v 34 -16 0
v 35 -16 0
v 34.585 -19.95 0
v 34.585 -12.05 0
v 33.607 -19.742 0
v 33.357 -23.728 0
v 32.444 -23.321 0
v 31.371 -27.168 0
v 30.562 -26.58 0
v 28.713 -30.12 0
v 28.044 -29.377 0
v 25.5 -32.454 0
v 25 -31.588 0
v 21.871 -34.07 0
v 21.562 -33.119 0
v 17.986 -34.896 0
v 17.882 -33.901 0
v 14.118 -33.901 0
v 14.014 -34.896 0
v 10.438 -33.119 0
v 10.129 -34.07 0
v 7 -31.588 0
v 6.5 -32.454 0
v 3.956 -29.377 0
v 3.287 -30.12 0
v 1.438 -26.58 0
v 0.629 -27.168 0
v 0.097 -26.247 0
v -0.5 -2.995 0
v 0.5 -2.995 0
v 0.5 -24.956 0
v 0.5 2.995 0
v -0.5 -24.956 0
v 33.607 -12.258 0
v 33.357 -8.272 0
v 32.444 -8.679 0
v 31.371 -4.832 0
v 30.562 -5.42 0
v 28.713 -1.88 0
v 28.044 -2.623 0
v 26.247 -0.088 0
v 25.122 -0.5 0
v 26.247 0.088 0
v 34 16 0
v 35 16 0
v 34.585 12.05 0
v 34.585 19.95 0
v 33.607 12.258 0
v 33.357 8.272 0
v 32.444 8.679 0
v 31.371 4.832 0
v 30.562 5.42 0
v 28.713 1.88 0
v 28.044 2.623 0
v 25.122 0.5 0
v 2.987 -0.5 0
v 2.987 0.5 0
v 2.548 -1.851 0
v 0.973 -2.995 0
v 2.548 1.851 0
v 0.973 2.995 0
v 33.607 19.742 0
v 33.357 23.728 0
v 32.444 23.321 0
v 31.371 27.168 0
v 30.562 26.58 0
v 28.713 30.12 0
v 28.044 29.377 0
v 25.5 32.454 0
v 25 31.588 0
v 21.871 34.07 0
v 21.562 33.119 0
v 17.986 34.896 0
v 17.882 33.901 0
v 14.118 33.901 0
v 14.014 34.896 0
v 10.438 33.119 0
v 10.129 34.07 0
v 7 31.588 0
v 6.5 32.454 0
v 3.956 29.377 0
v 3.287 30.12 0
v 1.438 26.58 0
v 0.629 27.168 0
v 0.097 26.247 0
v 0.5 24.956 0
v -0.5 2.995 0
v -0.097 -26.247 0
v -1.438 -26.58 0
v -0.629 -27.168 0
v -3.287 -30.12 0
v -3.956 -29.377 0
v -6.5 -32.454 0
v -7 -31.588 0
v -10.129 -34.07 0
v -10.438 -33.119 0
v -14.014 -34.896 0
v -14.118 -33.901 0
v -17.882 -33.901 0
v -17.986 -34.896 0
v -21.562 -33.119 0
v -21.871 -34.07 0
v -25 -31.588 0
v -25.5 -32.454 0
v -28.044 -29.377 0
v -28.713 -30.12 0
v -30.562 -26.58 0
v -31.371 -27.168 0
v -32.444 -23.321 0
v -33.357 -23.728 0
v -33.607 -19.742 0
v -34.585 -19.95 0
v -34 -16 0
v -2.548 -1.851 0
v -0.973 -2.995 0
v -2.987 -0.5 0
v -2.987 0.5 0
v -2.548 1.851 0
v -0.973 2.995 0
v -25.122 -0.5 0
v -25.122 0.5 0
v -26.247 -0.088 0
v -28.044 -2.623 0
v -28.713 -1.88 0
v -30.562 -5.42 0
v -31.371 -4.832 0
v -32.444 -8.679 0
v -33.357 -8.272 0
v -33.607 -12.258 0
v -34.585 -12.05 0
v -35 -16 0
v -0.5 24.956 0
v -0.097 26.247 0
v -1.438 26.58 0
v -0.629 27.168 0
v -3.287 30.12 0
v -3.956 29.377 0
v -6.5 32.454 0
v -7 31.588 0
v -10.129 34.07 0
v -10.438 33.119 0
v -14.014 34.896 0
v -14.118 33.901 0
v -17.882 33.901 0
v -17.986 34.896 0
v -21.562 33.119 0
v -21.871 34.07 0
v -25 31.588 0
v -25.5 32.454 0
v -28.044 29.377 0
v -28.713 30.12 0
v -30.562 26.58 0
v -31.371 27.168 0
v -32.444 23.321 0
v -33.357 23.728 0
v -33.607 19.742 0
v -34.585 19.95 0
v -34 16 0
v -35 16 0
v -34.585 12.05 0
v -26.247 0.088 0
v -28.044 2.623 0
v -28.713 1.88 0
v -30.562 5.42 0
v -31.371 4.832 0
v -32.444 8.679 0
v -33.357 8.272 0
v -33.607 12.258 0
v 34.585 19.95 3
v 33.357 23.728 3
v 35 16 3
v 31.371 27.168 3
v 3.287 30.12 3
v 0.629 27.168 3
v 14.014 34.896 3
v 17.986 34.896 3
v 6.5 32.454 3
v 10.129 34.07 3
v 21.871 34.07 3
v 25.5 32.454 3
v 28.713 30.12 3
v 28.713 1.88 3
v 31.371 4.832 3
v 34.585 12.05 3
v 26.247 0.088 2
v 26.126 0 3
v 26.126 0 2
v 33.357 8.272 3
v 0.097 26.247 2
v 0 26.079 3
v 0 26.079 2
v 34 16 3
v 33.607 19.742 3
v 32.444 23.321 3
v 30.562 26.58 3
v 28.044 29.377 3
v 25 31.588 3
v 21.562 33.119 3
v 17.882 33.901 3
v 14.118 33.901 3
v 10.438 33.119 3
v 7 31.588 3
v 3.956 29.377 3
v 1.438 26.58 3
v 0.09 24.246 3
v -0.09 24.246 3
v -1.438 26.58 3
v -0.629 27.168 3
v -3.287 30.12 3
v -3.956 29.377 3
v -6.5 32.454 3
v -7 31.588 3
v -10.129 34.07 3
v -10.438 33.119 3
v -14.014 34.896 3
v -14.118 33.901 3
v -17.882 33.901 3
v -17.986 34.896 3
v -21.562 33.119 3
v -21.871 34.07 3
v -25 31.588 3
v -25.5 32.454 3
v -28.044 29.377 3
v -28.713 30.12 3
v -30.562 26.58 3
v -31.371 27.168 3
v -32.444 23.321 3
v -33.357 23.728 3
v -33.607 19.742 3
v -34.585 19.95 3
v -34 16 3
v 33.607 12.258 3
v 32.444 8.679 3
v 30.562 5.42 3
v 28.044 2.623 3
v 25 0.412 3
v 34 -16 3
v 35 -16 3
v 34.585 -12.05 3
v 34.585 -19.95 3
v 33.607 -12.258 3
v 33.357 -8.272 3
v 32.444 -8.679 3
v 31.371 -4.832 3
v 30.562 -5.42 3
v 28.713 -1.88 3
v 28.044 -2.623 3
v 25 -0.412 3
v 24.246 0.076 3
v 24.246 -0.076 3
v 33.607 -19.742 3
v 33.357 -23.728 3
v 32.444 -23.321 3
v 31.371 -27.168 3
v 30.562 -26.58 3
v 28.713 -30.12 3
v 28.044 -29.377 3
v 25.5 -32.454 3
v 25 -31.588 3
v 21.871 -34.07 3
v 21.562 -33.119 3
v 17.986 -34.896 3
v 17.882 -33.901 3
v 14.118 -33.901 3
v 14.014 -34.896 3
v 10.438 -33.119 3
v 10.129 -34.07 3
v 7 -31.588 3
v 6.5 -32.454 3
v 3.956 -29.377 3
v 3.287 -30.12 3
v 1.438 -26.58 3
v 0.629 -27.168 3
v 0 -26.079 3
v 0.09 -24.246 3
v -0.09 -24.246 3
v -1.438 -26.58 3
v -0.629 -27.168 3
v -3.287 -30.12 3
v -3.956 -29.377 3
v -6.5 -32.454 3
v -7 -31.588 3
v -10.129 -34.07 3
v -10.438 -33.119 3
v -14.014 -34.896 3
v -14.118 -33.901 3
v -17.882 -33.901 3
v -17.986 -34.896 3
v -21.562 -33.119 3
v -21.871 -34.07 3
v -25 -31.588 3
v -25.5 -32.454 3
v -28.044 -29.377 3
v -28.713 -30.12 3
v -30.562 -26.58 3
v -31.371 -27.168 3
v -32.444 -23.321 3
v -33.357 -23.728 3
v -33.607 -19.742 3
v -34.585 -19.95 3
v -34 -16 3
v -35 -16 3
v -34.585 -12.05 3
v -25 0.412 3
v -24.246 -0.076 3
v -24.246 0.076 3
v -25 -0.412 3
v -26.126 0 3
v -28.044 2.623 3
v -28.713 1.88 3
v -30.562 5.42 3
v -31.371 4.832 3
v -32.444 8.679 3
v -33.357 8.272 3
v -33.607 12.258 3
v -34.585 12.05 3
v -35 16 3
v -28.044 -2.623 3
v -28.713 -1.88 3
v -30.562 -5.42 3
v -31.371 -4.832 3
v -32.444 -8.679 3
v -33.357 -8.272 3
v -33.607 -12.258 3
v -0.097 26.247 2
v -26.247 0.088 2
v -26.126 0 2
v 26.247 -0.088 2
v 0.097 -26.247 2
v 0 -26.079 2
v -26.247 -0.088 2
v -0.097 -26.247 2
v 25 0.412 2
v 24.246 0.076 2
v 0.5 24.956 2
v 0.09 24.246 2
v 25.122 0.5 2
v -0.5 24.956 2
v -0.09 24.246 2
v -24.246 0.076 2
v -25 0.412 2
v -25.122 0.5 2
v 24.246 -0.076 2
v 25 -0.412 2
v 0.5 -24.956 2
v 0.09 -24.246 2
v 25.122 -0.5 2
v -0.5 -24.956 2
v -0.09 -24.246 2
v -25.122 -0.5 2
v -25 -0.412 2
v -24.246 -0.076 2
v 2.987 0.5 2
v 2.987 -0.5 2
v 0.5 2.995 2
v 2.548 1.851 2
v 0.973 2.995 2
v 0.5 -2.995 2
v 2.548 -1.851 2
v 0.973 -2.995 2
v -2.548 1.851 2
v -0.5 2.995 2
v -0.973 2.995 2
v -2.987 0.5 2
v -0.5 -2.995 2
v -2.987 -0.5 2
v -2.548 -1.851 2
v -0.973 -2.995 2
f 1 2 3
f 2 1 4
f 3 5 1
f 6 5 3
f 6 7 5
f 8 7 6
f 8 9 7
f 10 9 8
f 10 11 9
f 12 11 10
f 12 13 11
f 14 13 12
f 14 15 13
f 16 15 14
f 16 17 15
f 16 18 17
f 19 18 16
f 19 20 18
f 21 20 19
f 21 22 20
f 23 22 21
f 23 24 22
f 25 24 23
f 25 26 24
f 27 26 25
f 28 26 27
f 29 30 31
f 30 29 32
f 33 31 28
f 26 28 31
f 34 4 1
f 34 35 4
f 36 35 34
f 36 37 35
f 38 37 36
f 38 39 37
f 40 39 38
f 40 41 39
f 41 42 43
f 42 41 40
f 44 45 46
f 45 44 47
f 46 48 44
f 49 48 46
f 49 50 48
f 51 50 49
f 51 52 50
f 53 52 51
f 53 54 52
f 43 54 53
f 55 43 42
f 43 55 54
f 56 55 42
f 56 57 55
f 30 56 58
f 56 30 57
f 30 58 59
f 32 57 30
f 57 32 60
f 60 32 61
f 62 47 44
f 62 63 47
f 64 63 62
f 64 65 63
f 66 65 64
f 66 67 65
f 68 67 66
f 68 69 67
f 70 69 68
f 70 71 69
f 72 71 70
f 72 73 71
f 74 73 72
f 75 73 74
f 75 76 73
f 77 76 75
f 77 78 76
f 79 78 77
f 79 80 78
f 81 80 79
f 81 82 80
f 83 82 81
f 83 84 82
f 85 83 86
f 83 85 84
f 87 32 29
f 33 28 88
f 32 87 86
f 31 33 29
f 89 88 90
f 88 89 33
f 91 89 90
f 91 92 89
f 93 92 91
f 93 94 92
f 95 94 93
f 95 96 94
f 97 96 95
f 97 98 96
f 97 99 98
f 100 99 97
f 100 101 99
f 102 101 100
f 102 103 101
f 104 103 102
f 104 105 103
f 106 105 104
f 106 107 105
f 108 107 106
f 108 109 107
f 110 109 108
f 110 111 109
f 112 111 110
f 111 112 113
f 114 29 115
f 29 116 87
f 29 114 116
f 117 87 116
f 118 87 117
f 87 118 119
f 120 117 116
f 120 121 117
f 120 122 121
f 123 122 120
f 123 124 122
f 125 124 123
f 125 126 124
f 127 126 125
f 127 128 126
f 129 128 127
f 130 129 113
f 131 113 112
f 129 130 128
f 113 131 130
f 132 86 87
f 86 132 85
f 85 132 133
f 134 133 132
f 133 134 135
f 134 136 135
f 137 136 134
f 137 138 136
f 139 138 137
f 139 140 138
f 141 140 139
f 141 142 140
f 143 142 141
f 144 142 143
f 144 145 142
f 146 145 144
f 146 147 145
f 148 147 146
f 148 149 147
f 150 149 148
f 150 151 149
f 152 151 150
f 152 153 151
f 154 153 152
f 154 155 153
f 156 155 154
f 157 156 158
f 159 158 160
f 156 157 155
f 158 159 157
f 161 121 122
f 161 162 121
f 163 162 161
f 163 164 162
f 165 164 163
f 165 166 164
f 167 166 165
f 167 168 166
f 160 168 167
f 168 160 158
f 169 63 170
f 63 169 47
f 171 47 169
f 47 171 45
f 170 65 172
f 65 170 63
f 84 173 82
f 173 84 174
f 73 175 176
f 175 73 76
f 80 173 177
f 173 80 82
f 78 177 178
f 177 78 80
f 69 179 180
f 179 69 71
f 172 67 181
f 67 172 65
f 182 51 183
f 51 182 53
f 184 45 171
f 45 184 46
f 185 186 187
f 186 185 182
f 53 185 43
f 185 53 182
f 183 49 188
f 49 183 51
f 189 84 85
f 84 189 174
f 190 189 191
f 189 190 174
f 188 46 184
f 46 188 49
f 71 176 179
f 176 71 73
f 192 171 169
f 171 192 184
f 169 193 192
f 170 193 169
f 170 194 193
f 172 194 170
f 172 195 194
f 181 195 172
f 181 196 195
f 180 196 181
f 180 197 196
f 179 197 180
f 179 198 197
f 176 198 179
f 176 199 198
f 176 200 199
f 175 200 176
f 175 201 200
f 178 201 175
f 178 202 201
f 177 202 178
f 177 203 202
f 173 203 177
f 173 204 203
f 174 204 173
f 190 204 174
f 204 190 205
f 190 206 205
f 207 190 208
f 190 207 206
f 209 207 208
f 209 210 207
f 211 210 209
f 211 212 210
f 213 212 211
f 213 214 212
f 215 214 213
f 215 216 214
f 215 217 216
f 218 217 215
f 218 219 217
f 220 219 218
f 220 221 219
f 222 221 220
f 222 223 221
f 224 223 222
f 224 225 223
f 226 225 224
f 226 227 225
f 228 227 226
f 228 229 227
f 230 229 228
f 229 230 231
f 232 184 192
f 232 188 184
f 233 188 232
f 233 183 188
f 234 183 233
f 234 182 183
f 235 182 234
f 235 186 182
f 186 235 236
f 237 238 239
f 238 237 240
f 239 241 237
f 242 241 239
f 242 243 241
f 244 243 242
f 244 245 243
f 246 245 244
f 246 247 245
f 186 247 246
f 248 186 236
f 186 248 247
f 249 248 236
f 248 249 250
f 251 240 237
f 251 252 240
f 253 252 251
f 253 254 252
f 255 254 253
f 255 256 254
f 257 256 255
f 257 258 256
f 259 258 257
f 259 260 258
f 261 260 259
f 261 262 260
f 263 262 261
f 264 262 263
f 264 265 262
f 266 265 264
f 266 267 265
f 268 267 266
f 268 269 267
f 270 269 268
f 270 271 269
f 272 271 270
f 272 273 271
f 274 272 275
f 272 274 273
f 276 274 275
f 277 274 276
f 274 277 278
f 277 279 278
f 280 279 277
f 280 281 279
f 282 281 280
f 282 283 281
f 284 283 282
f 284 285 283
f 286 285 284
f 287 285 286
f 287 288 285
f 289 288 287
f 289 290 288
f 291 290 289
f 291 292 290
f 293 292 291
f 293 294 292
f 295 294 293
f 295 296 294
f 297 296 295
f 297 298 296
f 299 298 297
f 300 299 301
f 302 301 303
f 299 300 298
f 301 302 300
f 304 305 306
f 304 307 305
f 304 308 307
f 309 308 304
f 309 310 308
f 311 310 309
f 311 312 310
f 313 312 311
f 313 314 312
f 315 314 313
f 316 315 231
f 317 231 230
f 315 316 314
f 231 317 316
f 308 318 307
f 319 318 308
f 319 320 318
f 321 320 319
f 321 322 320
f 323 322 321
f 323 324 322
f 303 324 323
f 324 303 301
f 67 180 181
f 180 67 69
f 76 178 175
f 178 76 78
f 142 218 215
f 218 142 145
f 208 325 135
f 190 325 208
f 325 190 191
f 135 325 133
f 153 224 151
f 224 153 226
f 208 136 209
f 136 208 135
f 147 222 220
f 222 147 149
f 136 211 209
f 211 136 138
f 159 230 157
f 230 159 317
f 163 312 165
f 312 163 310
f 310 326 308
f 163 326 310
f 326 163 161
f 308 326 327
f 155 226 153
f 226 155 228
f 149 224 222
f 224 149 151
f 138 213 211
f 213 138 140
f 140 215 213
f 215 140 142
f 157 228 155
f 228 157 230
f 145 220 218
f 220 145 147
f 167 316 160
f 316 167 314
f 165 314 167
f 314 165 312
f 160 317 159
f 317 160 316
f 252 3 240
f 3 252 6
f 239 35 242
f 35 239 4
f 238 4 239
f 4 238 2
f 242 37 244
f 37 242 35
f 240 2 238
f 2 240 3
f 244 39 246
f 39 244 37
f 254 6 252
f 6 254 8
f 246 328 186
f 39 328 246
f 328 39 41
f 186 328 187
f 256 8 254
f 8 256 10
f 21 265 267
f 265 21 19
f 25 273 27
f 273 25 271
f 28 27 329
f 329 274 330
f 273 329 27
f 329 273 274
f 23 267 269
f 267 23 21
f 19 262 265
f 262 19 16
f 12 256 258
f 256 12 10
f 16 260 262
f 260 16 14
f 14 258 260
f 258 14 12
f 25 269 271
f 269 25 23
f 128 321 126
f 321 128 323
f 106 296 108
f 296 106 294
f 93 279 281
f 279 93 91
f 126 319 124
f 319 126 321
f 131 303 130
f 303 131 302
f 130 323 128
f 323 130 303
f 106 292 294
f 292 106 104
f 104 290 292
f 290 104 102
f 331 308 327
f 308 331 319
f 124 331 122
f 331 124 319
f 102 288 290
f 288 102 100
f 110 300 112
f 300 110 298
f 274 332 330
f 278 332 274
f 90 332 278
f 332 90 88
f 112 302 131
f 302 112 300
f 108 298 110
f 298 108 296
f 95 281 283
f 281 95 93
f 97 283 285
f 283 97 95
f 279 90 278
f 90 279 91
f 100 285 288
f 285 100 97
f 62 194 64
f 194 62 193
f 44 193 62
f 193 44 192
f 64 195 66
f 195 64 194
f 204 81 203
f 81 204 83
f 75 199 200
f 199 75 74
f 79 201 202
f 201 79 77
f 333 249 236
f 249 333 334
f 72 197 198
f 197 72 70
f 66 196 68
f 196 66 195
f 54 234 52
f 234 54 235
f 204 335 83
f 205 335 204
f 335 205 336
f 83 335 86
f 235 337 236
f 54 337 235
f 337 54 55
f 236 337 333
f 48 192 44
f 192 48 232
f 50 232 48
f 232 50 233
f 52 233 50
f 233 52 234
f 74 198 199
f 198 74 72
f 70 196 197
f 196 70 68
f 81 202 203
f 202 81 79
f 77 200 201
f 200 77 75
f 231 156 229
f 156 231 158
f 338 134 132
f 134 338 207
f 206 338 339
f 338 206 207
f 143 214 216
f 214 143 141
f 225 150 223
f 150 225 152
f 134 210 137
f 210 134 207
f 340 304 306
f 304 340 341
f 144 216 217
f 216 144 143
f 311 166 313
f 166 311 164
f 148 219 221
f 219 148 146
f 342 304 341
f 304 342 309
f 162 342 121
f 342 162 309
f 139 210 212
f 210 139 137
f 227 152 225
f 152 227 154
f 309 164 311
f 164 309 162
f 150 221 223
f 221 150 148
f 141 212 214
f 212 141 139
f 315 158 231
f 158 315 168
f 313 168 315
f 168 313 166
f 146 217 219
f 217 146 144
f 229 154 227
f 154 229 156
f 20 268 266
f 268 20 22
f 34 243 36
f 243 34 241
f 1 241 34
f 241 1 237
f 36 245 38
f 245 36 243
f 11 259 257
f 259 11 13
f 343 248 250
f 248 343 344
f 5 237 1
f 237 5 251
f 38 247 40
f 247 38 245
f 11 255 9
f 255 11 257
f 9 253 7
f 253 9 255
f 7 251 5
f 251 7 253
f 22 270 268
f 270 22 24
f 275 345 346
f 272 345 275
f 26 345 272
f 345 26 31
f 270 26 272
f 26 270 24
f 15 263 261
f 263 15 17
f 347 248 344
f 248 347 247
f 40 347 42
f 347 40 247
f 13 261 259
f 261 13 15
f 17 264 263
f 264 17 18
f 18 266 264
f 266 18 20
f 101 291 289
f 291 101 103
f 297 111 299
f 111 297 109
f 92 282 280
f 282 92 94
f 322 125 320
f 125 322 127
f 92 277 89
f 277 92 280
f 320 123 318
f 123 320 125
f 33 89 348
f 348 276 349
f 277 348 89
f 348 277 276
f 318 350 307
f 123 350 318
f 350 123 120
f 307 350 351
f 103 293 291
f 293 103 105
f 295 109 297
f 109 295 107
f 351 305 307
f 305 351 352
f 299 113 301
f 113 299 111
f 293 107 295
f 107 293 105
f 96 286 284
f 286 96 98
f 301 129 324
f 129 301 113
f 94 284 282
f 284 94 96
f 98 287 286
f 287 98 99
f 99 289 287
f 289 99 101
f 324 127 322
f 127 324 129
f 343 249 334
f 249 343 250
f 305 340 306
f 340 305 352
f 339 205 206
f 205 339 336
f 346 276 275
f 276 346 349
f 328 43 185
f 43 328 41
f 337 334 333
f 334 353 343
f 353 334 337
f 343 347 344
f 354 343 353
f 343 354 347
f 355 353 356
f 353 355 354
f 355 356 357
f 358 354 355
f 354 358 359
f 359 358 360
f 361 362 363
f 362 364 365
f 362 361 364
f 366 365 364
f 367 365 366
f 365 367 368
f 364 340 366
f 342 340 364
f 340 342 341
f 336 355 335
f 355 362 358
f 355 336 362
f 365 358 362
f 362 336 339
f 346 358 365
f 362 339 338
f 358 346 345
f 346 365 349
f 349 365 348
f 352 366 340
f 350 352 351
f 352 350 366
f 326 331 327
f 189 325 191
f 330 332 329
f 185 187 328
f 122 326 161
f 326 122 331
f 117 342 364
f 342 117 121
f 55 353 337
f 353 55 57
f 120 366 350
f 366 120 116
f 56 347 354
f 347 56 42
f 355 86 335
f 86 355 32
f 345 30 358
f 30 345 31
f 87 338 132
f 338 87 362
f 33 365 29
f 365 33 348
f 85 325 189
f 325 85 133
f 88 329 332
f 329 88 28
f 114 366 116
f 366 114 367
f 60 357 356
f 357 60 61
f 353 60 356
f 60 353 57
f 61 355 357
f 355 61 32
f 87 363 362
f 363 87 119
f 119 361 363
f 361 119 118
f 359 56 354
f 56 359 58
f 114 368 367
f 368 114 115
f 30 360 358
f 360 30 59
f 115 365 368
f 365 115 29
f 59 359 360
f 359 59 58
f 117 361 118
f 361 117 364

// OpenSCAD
distance_betweek_propellers_axis = 32; 
bumper_inner_radius = 18; 
bumper_width = 1; 
cross_height = 2; 
bumper_height = 3; 

module  props(r1,r2, h) 
{

    translate([r1,r1,0])
    cylinder(h, r2,r2, center=false);

    translate([-r1,r1,0])
    cylinder(h, r2,r2, center=false);

    translate([r1,-r1,0])
    cylinder(h, r2,r2, center=false);

    translate([-r1,-r1,0])
    cylinder(h, r2,r2, center=false);
}

function CircleCircleIntPos(x,r) = (2*x + sqrt(4*x*x-(4*(2*x*x-r*r))))/2;
function CircleCircleIntNeg(x,r) = (2*x - sqrt(4*x*x-(4*(2*x*x-r*r))))/2;

//scale([.1,.1,.1])
module frame(d,r1, r2, h1,h2) 
{
    
    
    dh = d/2;
    union()
    {
        
        difference()
        {
            difference()
            {
                props(dh,r2,h2);
                translate([0,0,-h2*.5])            
                    props(dh,r1,2*h2);
            }
            
            l = 2*CircleCircleIntPos(dh,r1);
            translate([-l/2,-l/2,-h2*.5])
            cube([l,l, 2*h2], center=false);                        
        }
        
        
        l = 2*CircleCircleIntPos(dh,r2);

        translate([0,0,h1/2])
        {
        cube([l,1, h1], center=true);
        cube([1,l, h1], center=true);
        cylinder(h1,l*.06, l*.06, center=true);
        }

    }
}

frame(distance_betweek_propellers_axis,
        bumper_inner_radius, 
        bumper_inner_radius + bumper_width, 
        cross_height,
bumper_height);

//props(16,15, 1) ;
